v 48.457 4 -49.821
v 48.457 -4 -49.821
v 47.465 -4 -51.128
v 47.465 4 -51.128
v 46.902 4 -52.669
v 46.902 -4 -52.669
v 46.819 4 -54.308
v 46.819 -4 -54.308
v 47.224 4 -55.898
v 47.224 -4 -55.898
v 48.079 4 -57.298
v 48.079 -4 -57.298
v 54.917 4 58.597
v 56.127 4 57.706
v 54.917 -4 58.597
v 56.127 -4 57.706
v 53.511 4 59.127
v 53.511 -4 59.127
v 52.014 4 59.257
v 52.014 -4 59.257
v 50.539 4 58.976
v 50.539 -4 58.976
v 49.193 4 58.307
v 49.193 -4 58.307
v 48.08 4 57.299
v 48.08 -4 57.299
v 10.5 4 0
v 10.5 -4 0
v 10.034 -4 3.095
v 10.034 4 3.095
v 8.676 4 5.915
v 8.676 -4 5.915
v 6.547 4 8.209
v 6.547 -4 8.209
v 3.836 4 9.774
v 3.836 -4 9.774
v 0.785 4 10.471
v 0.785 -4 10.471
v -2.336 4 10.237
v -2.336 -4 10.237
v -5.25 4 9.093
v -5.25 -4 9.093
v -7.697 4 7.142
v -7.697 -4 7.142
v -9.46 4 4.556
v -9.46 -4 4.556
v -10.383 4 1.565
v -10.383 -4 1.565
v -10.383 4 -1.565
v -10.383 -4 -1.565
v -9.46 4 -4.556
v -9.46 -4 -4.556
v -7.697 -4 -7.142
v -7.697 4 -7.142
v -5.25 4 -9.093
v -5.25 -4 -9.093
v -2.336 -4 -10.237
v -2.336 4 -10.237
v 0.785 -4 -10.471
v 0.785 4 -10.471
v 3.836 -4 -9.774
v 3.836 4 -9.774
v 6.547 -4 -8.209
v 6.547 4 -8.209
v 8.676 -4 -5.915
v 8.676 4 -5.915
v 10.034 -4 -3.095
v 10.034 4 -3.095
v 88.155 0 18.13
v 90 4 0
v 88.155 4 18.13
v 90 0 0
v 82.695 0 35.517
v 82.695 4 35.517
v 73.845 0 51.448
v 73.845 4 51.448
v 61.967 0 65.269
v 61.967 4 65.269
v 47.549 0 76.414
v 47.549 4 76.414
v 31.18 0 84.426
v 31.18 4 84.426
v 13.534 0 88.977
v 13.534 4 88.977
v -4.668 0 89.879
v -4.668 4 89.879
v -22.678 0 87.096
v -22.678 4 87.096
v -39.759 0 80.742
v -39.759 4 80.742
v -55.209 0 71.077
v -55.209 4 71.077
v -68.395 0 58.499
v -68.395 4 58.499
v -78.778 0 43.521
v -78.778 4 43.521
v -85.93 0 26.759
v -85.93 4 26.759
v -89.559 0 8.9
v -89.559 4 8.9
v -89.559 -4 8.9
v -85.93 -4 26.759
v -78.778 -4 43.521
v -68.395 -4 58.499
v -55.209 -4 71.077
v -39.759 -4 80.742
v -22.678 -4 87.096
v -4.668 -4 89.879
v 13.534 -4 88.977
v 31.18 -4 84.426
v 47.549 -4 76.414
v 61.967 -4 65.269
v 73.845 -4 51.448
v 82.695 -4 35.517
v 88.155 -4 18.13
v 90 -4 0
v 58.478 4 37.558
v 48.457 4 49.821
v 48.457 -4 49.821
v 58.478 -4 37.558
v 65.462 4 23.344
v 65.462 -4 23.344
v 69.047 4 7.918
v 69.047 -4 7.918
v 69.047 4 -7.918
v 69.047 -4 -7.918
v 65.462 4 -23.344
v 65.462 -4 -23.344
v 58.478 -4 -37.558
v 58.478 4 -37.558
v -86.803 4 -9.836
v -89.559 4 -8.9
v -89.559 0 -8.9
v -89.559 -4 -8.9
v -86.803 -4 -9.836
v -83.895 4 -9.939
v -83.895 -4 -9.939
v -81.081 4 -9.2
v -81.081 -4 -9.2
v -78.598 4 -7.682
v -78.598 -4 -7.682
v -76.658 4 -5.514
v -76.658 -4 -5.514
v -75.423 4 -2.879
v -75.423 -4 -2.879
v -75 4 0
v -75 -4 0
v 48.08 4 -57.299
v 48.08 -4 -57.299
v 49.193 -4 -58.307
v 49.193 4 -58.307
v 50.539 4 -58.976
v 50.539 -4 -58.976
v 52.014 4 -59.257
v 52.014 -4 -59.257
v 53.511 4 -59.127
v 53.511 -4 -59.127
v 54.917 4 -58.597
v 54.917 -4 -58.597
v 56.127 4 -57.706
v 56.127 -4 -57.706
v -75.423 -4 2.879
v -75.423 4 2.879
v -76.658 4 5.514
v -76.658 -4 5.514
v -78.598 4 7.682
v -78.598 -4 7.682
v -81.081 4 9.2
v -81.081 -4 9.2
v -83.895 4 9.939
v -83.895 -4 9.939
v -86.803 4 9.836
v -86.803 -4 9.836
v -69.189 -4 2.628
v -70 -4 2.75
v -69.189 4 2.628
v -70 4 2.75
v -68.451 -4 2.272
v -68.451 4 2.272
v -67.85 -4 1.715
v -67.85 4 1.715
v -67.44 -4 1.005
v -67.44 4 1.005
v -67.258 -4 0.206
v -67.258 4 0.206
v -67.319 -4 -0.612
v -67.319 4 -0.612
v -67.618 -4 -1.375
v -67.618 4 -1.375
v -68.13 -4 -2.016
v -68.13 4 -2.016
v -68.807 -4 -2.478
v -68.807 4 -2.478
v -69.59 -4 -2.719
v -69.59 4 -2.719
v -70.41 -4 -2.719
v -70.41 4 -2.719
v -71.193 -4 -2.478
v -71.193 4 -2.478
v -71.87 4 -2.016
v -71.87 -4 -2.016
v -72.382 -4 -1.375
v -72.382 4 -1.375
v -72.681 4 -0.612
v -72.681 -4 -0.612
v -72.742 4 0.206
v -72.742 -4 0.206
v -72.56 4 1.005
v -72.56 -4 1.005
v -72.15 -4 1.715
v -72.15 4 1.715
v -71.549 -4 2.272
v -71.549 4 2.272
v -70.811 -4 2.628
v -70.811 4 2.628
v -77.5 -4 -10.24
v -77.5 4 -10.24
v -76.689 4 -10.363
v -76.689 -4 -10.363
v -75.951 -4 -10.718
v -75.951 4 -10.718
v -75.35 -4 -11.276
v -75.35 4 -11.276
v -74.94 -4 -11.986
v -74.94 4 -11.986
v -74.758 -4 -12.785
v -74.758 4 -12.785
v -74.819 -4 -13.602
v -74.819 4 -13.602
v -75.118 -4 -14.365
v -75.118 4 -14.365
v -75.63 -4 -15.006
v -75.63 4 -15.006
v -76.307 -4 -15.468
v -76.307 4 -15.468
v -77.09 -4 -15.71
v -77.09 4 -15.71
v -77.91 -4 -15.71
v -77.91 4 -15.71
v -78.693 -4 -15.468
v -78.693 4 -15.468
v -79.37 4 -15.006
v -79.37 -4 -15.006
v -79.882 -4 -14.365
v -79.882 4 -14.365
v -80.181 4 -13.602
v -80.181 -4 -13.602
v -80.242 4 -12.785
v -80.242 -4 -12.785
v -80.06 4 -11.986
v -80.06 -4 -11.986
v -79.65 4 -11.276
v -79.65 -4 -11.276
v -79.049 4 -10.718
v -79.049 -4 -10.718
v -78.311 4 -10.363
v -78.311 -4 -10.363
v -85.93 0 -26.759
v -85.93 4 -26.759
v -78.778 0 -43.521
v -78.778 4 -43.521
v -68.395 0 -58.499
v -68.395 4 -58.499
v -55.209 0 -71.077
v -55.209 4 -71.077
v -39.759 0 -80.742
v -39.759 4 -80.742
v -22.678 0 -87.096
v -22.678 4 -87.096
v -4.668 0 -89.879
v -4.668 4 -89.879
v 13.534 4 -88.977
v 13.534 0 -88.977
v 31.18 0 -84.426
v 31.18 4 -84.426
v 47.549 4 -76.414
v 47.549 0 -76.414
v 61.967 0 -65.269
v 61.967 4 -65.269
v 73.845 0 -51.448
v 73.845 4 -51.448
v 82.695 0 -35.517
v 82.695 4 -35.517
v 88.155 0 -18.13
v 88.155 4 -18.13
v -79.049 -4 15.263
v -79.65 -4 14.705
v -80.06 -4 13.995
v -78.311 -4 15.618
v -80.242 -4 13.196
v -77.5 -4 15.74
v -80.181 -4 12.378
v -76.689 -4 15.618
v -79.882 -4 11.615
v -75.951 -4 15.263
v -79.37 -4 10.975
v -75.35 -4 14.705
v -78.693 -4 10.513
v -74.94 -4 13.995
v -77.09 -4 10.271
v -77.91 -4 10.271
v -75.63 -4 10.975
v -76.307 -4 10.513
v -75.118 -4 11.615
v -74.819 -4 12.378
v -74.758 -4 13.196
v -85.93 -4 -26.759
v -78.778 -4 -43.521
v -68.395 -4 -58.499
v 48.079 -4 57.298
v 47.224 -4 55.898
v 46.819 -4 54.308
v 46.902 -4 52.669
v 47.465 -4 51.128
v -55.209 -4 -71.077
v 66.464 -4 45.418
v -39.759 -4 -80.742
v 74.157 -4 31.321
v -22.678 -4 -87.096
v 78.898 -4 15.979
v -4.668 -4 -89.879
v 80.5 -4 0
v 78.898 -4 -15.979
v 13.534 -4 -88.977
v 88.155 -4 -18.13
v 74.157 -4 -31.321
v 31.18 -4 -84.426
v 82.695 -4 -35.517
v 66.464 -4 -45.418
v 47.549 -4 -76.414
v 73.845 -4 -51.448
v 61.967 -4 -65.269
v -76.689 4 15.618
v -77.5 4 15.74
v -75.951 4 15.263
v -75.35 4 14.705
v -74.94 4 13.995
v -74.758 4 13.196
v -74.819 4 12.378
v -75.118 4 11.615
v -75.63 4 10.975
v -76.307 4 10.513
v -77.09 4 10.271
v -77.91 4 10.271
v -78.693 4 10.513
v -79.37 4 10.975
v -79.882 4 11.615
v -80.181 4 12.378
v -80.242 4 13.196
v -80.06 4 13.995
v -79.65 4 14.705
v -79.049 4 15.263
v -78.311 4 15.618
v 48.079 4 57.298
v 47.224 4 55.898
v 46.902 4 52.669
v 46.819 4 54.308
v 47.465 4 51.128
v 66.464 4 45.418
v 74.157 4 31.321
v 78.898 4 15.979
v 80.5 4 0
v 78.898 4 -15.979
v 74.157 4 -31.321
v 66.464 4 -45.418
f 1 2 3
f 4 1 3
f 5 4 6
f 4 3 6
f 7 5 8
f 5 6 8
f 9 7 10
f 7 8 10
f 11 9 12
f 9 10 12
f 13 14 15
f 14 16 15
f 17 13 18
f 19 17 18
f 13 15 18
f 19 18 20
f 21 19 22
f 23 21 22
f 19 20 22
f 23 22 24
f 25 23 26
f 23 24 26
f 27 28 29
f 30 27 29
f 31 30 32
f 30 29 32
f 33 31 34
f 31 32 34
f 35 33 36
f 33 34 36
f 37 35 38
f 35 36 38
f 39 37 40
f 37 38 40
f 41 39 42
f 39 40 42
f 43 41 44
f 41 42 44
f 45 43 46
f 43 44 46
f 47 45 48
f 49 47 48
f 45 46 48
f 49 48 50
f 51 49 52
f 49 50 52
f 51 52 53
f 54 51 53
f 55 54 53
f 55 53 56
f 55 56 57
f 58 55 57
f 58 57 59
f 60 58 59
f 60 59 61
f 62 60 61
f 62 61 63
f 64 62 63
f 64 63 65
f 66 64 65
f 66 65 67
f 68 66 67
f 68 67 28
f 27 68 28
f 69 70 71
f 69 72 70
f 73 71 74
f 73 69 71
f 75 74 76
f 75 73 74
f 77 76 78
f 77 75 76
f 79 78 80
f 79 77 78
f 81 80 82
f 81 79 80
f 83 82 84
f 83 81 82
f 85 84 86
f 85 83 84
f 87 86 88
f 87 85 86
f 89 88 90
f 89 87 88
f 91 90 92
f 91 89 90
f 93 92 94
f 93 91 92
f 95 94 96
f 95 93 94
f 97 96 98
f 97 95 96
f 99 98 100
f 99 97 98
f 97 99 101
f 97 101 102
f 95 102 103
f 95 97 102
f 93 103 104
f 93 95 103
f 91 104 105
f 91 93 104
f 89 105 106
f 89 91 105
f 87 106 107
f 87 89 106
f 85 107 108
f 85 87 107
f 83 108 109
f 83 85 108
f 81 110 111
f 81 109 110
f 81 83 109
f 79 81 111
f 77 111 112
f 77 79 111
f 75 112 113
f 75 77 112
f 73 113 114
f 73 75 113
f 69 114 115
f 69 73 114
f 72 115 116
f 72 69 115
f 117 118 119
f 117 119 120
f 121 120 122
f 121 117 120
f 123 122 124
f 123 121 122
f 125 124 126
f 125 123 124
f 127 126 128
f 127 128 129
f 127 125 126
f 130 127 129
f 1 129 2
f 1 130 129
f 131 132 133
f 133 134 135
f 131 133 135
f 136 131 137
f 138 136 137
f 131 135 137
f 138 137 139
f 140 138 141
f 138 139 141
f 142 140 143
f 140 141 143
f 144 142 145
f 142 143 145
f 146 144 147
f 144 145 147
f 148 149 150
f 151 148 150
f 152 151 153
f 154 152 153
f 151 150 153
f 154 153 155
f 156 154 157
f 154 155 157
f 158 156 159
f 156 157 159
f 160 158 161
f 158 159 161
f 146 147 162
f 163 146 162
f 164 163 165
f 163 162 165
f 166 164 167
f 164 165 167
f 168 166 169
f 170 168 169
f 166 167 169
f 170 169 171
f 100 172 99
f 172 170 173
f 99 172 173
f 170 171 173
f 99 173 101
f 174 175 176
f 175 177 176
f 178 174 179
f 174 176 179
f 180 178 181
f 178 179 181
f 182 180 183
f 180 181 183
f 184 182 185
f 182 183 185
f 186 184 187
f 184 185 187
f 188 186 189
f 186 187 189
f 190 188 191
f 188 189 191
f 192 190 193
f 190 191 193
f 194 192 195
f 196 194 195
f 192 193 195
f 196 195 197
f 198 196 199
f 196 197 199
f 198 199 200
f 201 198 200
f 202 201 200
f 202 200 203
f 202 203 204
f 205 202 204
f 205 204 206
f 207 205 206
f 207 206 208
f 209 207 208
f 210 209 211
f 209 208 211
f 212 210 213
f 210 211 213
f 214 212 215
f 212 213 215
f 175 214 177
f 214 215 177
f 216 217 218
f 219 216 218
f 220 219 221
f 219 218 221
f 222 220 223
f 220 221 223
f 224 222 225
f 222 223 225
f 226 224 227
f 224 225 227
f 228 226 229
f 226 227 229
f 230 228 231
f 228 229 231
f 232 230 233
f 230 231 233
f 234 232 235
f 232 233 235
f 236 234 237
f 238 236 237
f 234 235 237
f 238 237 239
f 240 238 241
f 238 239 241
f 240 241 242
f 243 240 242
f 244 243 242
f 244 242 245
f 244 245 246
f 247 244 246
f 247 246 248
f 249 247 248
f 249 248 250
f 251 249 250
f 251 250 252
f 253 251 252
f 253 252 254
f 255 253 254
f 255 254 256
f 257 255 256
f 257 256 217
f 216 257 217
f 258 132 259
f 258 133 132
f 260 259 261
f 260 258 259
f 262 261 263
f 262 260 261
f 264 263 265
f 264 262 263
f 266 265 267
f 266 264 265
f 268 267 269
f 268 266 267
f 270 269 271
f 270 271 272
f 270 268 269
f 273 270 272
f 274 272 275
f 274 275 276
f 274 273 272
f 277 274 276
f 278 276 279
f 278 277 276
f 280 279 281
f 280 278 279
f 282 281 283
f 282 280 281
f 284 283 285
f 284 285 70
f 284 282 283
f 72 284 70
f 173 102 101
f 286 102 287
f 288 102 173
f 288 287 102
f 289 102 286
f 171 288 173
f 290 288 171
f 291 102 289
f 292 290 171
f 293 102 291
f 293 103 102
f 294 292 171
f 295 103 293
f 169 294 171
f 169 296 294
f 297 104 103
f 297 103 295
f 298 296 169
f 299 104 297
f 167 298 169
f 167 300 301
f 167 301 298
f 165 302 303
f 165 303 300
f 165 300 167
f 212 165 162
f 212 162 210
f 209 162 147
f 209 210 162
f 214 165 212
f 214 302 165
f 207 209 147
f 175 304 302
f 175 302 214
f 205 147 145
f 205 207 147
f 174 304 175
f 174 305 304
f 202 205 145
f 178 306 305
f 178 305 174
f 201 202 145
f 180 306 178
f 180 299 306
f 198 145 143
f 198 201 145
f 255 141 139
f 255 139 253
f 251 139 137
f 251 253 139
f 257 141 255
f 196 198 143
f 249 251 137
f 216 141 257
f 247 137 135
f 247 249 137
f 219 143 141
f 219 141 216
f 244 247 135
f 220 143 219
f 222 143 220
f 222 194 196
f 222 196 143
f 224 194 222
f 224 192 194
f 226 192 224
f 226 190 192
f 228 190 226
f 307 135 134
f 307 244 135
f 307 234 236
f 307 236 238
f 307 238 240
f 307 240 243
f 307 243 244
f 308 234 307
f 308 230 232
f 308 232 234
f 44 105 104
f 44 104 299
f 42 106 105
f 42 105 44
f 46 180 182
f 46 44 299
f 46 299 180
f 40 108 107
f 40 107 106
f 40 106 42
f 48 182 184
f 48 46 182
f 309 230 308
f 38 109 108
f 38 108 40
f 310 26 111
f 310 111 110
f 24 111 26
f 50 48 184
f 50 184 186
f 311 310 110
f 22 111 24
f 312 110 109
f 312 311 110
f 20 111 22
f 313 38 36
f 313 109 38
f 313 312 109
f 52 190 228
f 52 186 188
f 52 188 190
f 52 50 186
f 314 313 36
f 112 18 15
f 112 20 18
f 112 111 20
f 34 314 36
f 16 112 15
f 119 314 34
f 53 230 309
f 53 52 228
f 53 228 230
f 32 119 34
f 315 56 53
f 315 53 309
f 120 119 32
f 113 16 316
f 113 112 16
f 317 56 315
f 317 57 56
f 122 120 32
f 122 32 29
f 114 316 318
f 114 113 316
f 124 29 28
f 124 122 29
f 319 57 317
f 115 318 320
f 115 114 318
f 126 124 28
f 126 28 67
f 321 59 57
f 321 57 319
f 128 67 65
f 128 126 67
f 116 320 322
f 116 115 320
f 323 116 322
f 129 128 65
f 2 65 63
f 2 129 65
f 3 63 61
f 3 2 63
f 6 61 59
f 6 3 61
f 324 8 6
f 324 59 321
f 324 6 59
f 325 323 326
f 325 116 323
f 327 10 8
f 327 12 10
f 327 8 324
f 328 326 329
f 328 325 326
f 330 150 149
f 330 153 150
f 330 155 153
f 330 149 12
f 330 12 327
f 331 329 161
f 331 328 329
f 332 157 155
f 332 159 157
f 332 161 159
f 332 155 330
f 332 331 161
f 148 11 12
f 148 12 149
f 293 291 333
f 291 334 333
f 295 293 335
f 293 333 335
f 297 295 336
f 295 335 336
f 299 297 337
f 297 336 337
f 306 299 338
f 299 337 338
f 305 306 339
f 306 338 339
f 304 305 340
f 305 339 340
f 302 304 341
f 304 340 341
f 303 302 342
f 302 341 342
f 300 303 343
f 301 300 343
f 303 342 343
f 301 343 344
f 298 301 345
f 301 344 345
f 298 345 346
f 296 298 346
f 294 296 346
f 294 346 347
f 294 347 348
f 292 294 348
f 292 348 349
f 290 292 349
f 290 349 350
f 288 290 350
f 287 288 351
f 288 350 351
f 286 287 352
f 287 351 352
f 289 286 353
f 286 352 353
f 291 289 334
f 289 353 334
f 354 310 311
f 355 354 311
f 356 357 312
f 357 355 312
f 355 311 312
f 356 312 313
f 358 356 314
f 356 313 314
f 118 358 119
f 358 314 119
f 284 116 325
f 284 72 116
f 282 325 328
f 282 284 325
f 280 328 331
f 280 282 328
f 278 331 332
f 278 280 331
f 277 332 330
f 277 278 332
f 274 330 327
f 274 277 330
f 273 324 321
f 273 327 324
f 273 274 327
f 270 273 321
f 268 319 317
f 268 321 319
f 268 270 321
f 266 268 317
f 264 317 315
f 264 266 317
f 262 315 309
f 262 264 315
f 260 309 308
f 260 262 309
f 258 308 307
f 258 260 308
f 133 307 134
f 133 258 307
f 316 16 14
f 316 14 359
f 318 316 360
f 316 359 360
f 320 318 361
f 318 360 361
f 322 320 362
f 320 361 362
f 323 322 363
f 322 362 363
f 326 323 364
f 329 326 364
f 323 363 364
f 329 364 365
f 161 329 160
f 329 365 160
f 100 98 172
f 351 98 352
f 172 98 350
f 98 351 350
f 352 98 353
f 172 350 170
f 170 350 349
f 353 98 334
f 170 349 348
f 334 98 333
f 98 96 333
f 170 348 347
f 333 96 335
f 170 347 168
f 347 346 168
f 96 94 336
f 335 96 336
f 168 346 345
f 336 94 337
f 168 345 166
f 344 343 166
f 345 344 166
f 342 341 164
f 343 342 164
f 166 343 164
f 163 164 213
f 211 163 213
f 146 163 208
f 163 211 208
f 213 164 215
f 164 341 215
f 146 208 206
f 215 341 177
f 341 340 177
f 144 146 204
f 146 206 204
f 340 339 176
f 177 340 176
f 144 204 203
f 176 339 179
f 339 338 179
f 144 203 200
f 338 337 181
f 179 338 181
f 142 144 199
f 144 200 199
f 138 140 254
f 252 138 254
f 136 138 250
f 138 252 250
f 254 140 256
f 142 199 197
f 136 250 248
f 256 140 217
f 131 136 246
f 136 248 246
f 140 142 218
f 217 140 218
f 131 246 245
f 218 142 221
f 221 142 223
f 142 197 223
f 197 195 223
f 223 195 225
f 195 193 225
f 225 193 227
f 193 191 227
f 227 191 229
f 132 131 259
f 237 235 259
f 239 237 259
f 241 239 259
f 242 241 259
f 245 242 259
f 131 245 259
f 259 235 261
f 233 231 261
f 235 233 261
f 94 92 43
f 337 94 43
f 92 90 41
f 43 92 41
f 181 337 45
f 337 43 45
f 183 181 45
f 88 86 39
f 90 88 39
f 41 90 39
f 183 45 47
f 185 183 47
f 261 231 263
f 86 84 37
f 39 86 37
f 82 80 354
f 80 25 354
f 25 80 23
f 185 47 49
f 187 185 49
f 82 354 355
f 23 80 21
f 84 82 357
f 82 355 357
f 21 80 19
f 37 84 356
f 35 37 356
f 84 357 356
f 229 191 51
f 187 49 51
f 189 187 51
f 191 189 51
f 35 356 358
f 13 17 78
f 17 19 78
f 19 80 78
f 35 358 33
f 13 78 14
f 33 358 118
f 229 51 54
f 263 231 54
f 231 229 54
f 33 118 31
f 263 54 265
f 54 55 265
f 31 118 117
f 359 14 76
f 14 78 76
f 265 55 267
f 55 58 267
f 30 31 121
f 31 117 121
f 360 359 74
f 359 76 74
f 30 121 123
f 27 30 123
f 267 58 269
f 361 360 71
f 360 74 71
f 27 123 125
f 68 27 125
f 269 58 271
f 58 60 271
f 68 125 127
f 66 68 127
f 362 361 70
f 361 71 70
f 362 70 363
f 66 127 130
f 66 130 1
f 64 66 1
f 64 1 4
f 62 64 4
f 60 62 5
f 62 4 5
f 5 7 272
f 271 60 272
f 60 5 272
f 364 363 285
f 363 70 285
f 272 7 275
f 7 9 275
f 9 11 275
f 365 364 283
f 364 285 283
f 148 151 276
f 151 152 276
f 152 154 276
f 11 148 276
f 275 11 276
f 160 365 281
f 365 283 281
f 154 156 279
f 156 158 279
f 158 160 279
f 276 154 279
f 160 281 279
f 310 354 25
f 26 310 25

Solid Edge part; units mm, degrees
sketch "Sketch1" plane through (0, 0, 0) normal (0, -1, 0) x (1, 0, 0)
  circle A0 centre (0, 0) radius 90
extrude "Protrusion1" add sketch "Sketch1" along normal mid plane 8
sketch "Sketch2" plane through (0, -4, 0) normal (0, -1, 0) x (1, 0, 0)
  circle A0 centre (0, 0) radius 10.5
  circle A1 centre (-85, 0) radius 10
extrude "ExtrudedCutout_1" cut sketch "Sketch2" along normal mid plane 282.4978
extrude "ExtrudedCutout_2" [suppressed]
sketch "Sketch3" plane through (0, 4, 0) normal (0, 1, 0) x (-1, 0, 0)
  arc A0 (-44.6737, 53.2401) -> (-44.6737, -53.2401) centre (0, 0) ccw
  line L0 (-44.6737, -53.2401) -> (-51.7444, -61.6666)
  arc A1 (-51.7444, 61.6666) -> (-51.7444, -61.6666) centre (0, 0) ccw
  line L1 (-44.6737, 53.2401) -> (-51.7444, 61.6666)
extrude "ExtrudedCutout_3" cut sketch "Sketch3" against normal blind 80.1209
fillet "Round_2" radius 5.5 4 edges at (51.7444, 0, 61.6666) (44.6737, 0, 53.2401) (44.6737, 0, -53.2401) (51.7444, 0, -61.6666)
sketch "Sketch4" plane through (0.2206, 4, 0) normal (0, 1, 0) x (0, 0, 1)
  circle A0 centre (-12.9904, -77.7206) radius 2.75
  circle A1 centre (0, -70.2206) radius 2.75
  circle A2 centre (12.9904, -77.7206) radius 2.75
extrude "ExtrudedCutout_4" cut sketch "Sketch4" against normal blind 34.5178
properties material "PVC"
